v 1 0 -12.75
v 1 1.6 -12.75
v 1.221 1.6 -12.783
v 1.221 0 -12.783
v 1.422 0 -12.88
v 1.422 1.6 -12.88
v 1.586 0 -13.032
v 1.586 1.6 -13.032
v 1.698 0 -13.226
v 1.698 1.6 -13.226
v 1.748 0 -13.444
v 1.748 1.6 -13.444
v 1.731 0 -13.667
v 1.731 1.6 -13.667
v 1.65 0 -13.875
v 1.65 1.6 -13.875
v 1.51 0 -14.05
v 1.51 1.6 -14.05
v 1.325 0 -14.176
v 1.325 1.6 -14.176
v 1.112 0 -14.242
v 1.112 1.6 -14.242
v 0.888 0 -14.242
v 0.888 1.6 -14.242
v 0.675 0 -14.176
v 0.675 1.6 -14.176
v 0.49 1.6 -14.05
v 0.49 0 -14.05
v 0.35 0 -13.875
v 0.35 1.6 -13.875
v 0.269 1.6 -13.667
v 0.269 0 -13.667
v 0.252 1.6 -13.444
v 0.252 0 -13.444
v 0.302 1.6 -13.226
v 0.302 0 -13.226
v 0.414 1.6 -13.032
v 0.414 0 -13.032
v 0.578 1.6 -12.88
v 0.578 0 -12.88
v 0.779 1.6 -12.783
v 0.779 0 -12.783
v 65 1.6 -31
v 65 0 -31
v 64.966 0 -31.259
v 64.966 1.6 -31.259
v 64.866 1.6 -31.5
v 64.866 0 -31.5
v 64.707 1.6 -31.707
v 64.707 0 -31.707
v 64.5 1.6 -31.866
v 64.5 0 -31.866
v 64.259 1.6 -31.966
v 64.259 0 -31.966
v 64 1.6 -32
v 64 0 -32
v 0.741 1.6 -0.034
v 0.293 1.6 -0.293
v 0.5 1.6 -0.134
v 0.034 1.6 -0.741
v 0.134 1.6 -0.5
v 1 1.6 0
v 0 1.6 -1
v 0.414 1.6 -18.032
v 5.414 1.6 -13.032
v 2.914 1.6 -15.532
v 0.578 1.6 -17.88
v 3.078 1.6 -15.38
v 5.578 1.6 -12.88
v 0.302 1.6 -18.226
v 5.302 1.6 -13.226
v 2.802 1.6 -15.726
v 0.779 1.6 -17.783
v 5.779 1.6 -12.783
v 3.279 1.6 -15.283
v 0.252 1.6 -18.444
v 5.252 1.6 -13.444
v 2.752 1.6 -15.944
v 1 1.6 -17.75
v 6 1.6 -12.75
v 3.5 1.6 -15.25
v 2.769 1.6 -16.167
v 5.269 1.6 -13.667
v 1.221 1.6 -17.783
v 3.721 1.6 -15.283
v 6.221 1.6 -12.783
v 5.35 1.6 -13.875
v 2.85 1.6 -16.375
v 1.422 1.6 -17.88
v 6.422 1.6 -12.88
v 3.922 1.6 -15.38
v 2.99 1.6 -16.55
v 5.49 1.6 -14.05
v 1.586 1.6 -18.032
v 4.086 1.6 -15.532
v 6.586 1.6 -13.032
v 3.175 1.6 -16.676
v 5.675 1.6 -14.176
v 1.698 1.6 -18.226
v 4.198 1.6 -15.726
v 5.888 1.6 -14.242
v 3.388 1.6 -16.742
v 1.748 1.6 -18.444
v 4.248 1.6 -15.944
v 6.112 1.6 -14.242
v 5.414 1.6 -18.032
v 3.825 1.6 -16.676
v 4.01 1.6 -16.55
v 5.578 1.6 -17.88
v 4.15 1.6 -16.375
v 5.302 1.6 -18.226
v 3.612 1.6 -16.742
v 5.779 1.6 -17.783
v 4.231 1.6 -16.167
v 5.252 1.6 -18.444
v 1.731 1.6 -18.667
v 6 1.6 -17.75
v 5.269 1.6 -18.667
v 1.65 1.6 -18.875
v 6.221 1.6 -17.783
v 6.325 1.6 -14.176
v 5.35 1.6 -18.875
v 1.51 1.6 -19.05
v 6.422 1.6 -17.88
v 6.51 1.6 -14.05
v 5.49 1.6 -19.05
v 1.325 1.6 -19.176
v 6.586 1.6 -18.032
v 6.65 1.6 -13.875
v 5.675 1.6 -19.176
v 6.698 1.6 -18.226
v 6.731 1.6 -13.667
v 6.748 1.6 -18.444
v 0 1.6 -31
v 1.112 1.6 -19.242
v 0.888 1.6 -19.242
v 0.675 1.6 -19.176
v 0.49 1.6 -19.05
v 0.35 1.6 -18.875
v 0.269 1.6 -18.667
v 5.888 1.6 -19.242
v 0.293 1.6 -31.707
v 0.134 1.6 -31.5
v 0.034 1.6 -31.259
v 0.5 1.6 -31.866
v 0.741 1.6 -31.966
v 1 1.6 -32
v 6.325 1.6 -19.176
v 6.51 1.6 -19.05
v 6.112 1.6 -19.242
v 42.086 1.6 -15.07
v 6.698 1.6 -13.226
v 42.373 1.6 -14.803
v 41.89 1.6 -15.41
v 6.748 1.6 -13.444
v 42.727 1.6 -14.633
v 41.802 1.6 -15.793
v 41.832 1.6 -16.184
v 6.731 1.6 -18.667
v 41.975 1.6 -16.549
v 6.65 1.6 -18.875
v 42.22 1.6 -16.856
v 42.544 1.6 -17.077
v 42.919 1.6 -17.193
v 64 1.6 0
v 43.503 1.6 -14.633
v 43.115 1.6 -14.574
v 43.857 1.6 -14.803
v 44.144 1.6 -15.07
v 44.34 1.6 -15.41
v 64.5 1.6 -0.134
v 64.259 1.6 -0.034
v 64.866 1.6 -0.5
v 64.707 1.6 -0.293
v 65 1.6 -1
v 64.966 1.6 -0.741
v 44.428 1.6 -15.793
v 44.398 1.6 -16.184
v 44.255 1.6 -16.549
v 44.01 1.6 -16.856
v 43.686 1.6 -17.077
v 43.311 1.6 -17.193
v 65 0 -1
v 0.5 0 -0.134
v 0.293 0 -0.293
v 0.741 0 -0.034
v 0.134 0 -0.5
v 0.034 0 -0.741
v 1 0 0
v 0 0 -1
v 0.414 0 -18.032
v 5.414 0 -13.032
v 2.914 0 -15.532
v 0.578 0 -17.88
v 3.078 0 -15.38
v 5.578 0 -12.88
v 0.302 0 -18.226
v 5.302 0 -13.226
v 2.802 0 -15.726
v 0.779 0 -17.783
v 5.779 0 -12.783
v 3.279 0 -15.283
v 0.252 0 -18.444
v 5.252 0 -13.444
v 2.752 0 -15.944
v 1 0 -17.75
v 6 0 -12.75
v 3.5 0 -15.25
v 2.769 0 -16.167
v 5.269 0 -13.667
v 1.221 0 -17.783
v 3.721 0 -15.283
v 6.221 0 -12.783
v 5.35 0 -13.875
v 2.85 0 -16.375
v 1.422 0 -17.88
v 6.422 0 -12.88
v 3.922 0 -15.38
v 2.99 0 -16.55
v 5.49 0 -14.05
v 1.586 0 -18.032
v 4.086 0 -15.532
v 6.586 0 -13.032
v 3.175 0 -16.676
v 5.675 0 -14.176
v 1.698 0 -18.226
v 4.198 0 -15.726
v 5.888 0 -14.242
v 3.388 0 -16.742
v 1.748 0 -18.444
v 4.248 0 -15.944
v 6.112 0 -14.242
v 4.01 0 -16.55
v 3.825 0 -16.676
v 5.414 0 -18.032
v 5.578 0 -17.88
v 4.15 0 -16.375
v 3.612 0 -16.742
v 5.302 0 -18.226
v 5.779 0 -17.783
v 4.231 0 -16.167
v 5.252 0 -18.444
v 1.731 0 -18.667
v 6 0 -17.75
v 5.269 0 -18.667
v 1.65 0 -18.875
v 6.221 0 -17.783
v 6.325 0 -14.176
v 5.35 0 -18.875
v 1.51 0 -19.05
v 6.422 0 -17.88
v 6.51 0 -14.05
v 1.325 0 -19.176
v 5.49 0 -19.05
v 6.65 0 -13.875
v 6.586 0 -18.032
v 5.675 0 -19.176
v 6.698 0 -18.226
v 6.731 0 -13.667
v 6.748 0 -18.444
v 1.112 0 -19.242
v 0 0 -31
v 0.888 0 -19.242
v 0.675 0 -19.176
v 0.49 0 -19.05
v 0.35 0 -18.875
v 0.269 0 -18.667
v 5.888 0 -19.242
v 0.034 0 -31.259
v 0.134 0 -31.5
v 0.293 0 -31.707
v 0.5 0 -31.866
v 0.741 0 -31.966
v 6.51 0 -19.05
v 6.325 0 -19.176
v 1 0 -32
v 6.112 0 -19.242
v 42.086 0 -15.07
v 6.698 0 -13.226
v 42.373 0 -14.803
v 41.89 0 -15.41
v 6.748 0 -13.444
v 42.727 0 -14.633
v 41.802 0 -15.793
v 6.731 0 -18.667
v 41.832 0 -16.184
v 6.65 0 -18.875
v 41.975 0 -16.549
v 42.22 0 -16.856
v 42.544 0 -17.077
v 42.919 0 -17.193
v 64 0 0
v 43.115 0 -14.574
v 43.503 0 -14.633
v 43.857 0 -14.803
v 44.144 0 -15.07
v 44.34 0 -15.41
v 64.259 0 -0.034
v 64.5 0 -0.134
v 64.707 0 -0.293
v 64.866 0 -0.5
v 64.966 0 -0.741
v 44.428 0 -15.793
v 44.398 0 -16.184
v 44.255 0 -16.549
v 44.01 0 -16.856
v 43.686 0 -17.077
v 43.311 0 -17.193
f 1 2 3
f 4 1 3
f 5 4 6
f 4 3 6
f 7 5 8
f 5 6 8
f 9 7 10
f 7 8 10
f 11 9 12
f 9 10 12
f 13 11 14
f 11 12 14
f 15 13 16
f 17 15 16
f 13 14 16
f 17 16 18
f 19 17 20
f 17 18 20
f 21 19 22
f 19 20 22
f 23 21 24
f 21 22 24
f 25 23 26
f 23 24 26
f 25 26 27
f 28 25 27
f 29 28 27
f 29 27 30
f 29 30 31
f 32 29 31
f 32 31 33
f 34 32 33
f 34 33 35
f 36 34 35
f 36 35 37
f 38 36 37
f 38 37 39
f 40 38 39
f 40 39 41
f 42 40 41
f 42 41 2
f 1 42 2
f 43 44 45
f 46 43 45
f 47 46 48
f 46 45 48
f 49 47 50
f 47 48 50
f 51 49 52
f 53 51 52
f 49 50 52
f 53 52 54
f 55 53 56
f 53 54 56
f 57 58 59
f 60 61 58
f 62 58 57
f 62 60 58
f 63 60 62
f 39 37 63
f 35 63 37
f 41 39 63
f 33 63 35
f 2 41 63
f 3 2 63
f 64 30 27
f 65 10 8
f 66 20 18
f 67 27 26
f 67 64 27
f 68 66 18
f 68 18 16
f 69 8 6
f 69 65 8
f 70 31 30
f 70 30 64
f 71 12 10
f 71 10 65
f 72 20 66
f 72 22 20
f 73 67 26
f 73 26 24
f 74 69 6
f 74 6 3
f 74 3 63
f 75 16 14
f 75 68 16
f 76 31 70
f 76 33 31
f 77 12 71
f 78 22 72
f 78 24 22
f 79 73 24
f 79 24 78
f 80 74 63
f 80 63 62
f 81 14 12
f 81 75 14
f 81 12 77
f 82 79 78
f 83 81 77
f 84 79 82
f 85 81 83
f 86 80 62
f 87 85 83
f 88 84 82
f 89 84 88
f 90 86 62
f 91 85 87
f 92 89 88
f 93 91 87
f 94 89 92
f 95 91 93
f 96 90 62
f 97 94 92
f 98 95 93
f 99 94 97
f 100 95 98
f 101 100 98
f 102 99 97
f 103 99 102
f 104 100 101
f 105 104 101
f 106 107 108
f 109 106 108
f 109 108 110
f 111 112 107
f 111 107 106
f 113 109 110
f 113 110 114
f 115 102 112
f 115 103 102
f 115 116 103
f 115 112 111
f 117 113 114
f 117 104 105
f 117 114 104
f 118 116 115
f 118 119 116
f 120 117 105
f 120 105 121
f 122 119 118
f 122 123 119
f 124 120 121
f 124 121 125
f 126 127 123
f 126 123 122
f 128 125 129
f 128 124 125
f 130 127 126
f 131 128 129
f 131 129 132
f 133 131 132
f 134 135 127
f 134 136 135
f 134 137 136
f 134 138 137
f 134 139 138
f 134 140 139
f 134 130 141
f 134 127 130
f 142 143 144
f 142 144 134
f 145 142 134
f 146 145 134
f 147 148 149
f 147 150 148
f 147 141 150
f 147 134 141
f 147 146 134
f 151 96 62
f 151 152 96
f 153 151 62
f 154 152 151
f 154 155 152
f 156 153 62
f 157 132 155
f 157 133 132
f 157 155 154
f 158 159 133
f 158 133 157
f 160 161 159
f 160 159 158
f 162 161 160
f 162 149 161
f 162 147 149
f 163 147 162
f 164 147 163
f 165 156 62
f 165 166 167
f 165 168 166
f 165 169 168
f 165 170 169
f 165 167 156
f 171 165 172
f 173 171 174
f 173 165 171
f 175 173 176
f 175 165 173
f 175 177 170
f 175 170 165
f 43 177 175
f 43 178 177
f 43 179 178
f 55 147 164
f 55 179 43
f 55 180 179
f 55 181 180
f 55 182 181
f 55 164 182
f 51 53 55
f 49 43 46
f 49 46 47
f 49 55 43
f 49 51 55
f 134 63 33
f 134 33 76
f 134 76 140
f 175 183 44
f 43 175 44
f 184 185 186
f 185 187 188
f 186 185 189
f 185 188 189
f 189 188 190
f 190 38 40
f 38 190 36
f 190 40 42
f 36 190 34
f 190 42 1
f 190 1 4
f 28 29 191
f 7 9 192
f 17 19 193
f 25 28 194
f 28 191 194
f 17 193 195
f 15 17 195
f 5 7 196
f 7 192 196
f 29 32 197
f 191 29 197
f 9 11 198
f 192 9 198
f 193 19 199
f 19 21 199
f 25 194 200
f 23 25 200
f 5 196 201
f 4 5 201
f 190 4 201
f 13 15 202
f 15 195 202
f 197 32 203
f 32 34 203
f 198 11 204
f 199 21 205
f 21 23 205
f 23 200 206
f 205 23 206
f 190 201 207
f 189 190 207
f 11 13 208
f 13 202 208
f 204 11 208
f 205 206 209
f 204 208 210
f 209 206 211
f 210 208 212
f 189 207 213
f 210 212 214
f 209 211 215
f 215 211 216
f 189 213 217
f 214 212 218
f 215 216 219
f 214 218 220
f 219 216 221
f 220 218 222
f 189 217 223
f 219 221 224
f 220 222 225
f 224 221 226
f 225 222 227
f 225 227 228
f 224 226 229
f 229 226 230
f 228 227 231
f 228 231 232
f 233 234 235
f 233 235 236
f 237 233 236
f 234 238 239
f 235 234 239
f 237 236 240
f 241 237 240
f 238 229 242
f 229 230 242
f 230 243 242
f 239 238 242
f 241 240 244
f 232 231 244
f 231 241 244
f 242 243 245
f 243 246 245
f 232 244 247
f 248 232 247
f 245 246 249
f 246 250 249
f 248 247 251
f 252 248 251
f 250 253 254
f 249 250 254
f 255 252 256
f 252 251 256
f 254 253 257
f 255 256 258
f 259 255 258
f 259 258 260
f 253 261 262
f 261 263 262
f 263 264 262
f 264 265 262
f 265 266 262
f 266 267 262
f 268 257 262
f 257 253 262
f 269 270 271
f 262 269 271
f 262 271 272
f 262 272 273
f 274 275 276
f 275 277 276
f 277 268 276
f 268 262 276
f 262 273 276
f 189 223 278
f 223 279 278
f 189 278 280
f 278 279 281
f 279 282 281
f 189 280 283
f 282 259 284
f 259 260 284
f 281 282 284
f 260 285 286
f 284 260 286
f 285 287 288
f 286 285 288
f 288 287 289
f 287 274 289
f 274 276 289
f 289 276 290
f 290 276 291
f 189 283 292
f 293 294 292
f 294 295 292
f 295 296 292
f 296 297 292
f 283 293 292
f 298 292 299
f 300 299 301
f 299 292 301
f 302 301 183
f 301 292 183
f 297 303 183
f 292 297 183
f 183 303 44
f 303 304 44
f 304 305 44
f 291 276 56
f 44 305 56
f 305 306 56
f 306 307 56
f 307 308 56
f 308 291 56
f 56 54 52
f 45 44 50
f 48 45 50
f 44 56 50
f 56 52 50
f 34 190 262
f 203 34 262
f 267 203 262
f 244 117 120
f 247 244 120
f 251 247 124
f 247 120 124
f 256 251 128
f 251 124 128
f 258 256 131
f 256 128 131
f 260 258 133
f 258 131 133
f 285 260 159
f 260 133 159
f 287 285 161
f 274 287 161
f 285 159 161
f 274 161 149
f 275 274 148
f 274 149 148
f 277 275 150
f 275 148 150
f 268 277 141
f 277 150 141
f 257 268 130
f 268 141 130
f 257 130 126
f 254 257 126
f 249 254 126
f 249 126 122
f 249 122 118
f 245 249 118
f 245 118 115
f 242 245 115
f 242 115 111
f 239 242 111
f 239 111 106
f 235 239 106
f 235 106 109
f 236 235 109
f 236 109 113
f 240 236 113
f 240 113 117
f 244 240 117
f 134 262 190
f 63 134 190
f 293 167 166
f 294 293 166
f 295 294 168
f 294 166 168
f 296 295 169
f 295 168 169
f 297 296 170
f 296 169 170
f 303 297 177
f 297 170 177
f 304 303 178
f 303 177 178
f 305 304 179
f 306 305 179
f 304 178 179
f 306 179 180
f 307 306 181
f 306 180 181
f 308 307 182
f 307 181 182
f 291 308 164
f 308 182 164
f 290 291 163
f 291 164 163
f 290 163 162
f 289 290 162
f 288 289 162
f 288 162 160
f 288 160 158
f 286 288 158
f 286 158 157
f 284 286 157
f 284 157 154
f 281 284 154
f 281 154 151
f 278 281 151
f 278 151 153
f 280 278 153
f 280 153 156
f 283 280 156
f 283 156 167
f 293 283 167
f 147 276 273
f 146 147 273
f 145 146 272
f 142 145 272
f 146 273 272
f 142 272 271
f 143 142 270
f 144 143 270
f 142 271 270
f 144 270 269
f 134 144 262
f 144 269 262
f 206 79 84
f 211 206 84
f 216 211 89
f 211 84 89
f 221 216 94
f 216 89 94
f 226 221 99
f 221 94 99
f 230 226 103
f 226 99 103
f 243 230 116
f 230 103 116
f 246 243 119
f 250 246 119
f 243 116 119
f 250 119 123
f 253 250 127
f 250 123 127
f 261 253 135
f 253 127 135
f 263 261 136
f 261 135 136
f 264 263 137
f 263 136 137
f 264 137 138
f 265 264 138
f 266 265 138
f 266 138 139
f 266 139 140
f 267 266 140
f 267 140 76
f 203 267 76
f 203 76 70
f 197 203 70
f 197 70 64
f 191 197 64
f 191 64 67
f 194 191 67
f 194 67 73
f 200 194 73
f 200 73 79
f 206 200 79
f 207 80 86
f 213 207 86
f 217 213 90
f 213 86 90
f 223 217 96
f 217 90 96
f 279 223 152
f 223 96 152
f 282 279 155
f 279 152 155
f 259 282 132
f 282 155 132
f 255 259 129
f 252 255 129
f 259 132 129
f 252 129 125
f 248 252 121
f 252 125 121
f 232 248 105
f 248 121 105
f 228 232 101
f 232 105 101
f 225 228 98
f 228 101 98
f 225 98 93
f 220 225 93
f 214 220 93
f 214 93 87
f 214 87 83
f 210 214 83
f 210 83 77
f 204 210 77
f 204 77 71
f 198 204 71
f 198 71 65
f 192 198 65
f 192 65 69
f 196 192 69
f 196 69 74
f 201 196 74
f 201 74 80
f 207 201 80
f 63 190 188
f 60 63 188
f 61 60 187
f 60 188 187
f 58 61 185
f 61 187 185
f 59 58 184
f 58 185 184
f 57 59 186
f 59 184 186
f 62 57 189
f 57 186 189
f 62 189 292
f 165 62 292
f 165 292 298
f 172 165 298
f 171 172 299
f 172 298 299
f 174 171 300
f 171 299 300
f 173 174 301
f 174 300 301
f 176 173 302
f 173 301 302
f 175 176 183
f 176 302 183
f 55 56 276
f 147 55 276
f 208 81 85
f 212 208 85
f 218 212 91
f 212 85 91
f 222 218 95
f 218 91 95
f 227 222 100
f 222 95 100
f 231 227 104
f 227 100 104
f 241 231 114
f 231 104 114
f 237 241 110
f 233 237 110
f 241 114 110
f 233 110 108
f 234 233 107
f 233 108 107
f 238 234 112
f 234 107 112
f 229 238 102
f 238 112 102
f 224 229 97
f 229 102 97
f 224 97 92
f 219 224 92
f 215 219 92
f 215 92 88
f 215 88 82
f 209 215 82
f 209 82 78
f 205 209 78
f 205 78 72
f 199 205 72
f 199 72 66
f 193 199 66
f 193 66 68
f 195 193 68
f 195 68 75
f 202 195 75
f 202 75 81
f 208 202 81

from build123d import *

# Parameters (mm, degrees)
BOSS_EXTRUDE1_DEPTH = 1.6
CUT_EXTRUDE2_REACH  = 74.468
SKETCH8_R           = 0.75
CUT_EXTRUDE3_REACH  = 74.468
SKETCH9_R           = 1.316483274


with BuildPart() as part:
    # Sketch1 → Boss-Extrude1 (new body)
    with BuildSketch(Plane(origin=(0, 0, 0), x_dir=(1, 0, 0), z_dir=(0, 1, 0))):
        with BuildLine():
            Line((1, 0), (64, 0))
            ThreePointArc((64, 0), (64.707106781, 0.292893219), (65, 1))
            Line((65, 1), (65, 31))
            ThreePointArc((65, 31), (64.707106781, 31.707106781), (64, 32))
            Line((64, 32), (1, 32))
            ThreePointArc((1, 32), (0.292893219, 31.707106781), (0, 31))
            Line((0, 31), (0, 1))
            ThreePointArc((0, 1), (0.292893219, 0.292893219), (1, 0))
        make_face()
    extrude(amount=BOSS_EXTRUDE1_DEPTH)

    # Sketch8 → Cut-Extrude2 (cut, up to next)
    with BuildSketch(Plane(origin=(0, 1.6, 0), x_dir=(1, 0, 0), z_dir=(0, 1, 0)), mode=Mode.PRIVATE) as cut_extrude2_sk1:
        with Locations(Location((3.5, 16, 0), (0, 0, 270))):
            Circle(SKETCH8_R)
    cut_extrude2_tool1 = extrude(cut_extrude2_sk1.sketch, amount=-CUT_EXTRUDE2_REACH, mode=Mode.PRIVATE) & part.part
    # Sketch8 → Cut-Extrude2 (cut, up to next)
    with BuildSketch(Plane(origin=(0, 1.6, 0), x_dir=(1, 0, 0), z_dir=(0, 1, 0)), mode=Mode.PRIVATE) as cut_extrude2_sk2:
        with Locations(Location((6, 18.5, 0), (0, 0, 270))):
            Circle(SKETCH8_R)
    cut_extrude2_tool2 = extrude(cut_extrude2_sk2.sketch, amount=-CUT_EXTRUDE2_REACH, mode=Mode.PRIVATE) & part.part
    # Sketch8 → Cut-Extrude2 (cut, up to next)
    with BuildSketch(Plane(origin=(0, 1.6, 0), x_dir=(1, 0, 0), z_dir=(0, 1, 0)), mode=Mode.PRIVATE) as cut_extrude2_sk3:
        with Locations(Location((6, 13.5, 0), (0, 0, 270))):
            Circle(SKETCH8_R)
    cut_extrude2_tool3 = extrude(cut_extrude2_sk3.sketch, amount=-CUT_EXTRUDE2_REACH, mode=Mode.PRIVATE) & part.part
    # Sketch8 → Cut-Extrude2 (cut, up to next)
    with BuildSketch(Plane(origin=(0, 1.6, 0), x_dir=(1, 0, 0), z_dir=(0, 1, 0)), mode=Mode.PRIVATE) as cut_extrude2_sk4:
        with Locations(Location((1, 13.499992953, 0), (0, 0, 270))):
            Circle(SKETCH8_R)
    cut_extrude2_tool4 = extrude(cut_extrude2_sk4.sketch, amount=-CUT_EXTRUDE2_REACH, mode=Mode.PRIVATE) & part.part
    # Sketch8 → Cut-Extrude2 (cut, up to next)
    with BuildSketch(Plane(origin=(0, 1.6, 0), x_dir=(1, 0, 0), z_dir=(0, 1, 0)), mode=Mode.PRIVATE) as cut_extrude2_sk5:
        with Locations(Location((1, 18.499992953, 0), (0, 0, 270))):
            Circle(SKETCH8_R)
    cut_extrude2_tool5 = extrude(cut_extrude2_sk5.sketch, amount=-CUT_EXTRUDE2_REACH, mode=Mode.PRIVATE) & part.part
    add(cut_extrude2_tool1.solids().sort_by_distance((3.5, 1.6, -16))[0], mode=Mode.SUBTRACT)
    add(cut_extrude2_tool2.solids().sort_by_distance((6, 1.6, -18.5))[0], mode=Mode.SUBTRACT)
    add(cut_extrude2_tool3.solids().sort_by_distance((6, 1.6, -13.5))[0], mode=Mode.SUBTRACT)
    add(cut_extrude2_tool4.solids().sort_by_distance((1, 1.6, -13.499993))[0], mode=Mode.SUBTRACT)
    add(cut_extrude2_tool5.solids().sort_by_distance((1, 1.6, -18.499993))[0], mode=Mode.SUBTRACT)

    # Sketch9 → Cut-Extrude3 (cut, up to next)
    with BuildSketch(Plane(origin=(0, 1.6, 0), x_dir=(1, 0, 0), z_dir=(0, 1, 0)), mode=Mode.PRIVATE) as cut_extrude3_sk1:
        with Locations(Location((43.114982321, 15.890924109, 0), (0, 0, 270))):
            Circle(SKETCH9_R)
    cut_extrude3_tool1 = extrude(cut_extrude3_sk1.sketch, amount=-CUT_EXTRUDE3_REACH, mode=Mode.PRIVATE) & part.part
    add(cut_extrude3_tool1.solids().sort_by_distance((43.114982, 1.6, -15.890924))[0], mode=Mode.SUBTRACT)


solid = part.part
